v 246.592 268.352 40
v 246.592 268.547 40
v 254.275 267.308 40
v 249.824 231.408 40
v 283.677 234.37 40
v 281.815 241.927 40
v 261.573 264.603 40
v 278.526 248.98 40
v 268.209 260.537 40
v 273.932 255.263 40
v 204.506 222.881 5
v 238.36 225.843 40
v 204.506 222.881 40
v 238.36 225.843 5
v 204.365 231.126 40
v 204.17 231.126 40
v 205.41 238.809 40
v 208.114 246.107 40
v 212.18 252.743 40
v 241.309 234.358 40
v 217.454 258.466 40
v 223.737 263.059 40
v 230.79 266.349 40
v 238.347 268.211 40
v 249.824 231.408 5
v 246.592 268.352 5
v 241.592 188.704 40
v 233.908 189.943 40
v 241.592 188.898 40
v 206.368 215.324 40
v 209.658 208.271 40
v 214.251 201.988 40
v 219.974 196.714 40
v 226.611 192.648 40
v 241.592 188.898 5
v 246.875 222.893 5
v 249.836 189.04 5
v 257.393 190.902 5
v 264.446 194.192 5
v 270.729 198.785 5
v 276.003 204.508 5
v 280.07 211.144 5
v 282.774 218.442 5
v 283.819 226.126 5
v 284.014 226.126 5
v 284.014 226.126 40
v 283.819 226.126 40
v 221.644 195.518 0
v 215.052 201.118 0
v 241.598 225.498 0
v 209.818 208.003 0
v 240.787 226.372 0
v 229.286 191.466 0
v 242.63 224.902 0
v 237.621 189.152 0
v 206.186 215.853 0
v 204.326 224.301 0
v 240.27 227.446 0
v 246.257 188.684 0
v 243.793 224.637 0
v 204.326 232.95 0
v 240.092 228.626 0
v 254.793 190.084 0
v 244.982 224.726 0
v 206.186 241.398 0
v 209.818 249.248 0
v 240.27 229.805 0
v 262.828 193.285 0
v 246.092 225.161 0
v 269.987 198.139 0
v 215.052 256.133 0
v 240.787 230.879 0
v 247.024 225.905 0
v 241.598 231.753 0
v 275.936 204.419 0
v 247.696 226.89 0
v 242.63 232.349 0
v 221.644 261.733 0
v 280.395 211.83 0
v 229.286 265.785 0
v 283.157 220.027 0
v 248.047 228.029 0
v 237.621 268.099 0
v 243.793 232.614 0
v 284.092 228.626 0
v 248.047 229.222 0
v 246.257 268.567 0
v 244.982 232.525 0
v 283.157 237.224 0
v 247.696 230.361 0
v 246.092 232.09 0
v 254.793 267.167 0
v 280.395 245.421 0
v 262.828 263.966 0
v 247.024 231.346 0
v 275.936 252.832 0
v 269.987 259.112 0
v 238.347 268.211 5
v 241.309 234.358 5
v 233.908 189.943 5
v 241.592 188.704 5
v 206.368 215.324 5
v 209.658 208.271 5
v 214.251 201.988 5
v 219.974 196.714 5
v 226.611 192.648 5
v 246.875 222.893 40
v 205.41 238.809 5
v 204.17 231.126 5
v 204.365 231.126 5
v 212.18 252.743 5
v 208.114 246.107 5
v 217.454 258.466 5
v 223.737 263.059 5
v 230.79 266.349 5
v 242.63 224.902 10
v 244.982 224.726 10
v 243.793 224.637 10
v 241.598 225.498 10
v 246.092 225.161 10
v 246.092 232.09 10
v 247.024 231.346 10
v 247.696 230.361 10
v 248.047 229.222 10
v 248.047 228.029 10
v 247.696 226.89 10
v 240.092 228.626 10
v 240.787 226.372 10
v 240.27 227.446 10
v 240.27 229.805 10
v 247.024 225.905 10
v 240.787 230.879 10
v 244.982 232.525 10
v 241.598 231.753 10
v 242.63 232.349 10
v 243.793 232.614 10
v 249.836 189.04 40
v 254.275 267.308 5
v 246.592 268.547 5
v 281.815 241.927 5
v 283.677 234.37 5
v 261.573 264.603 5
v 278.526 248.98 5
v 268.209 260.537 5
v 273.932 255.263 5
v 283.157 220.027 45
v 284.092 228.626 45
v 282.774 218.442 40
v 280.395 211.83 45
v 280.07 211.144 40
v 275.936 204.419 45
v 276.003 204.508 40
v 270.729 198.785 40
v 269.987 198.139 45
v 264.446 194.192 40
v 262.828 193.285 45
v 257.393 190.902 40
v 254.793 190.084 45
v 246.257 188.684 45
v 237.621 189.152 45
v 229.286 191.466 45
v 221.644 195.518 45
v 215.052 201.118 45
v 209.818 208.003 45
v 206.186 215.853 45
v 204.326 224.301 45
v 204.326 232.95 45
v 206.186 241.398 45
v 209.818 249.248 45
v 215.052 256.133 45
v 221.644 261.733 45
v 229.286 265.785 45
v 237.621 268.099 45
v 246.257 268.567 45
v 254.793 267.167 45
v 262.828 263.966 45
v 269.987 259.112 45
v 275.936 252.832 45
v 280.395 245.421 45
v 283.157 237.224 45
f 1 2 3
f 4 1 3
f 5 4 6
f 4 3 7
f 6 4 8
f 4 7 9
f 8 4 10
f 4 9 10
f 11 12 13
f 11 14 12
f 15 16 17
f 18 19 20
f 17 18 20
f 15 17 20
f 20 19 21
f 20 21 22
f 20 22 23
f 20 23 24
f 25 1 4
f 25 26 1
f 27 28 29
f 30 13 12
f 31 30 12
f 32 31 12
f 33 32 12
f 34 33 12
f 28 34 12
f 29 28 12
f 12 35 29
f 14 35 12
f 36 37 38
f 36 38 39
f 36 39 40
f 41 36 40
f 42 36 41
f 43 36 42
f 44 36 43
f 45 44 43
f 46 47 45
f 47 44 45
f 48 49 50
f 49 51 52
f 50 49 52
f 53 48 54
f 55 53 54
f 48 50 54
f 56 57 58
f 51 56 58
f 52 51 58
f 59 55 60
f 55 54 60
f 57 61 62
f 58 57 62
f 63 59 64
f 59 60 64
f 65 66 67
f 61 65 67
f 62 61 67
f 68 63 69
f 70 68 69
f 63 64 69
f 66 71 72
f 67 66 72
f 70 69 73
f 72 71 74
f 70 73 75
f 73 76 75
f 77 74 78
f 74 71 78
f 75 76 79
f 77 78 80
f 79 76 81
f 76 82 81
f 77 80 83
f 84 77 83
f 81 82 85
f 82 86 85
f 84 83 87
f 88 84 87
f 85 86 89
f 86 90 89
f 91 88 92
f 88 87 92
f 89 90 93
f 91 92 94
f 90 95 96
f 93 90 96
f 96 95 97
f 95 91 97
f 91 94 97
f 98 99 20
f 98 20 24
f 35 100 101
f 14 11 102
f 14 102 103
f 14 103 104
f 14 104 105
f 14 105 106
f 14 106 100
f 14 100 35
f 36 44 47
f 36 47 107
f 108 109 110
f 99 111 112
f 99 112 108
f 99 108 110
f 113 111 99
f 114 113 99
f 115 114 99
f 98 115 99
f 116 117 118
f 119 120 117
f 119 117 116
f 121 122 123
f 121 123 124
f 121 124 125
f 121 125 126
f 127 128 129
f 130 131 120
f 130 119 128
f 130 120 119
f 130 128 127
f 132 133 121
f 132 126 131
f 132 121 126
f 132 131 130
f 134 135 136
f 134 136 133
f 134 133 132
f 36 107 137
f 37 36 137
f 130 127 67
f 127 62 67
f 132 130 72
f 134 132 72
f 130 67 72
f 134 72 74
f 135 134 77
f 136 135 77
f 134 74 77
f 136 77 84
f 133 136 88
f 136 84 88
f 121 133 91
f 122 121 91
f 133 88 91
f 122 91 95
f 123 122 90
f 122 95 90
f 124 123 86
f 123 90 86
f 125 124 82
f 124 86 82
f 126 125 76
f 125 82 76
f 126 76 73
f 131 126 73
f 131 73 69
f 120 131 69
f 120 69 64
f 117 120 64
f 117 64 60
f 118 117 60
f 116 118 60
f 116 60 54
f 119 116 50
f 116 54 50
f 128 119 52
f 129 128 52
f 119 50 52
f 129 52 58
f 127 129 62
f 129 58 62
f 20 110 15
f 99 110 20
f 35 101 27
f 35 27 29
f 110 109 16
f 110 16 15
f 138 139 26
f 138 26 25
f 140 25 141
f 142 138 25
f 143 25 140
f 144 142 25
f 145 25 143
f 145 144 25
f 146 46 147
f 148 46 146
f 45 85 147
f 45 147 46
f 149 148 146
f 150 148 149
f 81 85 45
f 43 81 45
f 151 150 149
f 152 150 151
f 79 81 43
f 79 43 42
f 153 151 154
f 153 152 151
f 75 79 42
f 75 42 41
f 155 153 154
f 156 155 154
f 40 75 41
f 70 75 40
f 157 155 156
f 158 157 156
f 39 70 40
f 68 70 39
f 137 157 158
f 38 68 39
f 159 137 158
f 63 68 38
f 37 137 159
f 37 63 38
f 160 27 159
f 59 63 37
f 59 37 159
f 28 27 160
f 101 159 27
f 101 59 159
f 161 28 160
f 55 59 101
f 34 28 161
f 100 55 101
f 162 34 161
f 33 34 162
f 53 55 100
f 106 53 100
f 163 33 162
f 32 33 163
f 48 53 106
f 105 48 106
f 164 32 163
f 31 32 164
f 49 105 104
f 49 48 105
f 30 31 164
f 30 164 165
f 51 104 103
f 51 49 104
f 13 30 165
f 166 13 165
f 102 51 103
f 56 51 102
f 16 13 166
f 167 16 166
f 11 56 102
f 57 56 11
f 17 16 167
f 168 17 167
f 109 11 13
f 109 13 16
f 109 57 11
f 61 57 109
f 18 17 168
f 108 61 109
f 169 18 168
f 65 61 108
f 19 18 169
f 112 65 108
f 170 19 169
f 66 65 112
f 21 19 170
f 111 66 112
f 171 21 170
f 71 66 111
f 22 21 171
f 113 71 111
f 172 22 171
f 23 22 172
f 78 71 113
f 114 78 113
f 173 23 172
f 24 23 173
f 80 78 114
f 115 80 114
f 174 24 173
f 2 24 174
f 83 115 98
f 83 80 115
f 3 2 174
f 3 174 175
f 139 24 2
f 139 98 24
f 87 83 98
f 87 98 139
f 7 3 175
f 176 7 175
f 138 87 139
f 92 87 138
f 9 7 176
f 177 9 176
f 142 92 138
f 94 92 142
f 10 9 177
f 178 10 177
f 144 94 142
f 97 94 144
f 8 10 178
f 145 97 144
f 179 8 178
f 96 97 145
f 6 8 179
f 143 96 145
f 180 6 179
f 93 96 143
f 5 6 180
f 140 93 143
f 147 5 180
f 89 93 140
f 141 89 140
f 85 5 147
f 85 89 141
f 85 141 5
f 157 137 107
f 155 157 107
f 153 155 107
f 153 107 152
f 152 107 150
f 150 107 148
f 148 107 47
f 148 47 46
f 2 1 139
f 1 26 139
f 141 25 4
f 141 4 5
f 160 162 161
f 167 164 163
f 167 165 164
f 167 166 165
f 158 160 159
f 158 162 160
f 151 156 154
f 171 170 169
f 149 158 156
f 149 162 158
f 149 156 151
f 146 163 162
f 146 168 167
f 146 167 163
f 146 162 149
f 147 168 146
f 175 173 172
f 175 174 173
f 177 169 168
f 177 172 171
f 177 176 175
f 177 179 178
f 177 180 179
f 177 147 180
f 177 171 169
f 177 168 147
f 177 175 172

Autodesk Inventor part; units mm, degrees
ref_plane "YZ Plane" through (0, 0, 0) normal (1, 0, 0) x (0, 1, 0)
ref_plane "XZ Plane" through (0, 0, 0) normal (0, 1, 0) x (-1, 0, 0)
ref_plane "XY Plane" through (0, 0, 0) normal (0, 0, 1) x (1, 0, 0)
sketch "Sketch1" plane through (0, 0, 0) normal (0, 0, 1) x (1, 0, 0)
  line L0 (204.17, 231.1255) -> (241.5918, 231.1255)
  line L1 (241.5918, 231.1255) -> (284.0136, 231.1255)
  line L2 (204.17, 226.1255) -> (241.5918, 226.1255)
  line L3 (246.5918, 226.1255) -> (284.0136, 226.1255)
  line L4 (246.5918, 188.7037) -> (246.5918, 226.1255)
  line L5 (246.5918, 231.1255) -> (246.5918, 268.5473)
  line L6 (241.5918, 188.7037) -> (241.5918, 226.1255)
  line L7 (241.5918, 231.1255) -> (241.5918, 268.5473)
  line L8 (241.5918, 231.1255) -> (288.8318, 231.1255) construction
  line L9 (246.5918, 231.1255) -> (303.9178, 231.1255) construction
  line L10 (246.5918, 288.5734) -> (304.1186, 288.5734) construction
  circle A0 centre (244.0918, 228.6255) radius 40
  line L11 (246.5918, 226.1255) -> (249.8364, 189.0401)
  line L12 (246.5918, 226.1255) -> (283.8188, 226.1255) construction
  line L13 (283.8188, 226.1255) -> (246.5918, 222.8685)
  line L14 (283.8188, 226.1255) -> (321.1881, 226.1255) construction
  line L15 (246.5918, 231.1255) -> (283.6772, 234.37)
  line L16 (246.5918, 268.3525) -> (249.8488, 231.1255)
  line L17 (241.5918, 231.1255) -> (238.3473, 268.2108)
  line L18 (204.3648, 231.1255) -> (241.5918, 234.3824)
  line L19 (241.5918, 226.1255) -> (204.5065, 222.8809)
  line L20 (241.5918, 188.8985) -> (238.3349, 226.1255)
  point P0 (0, 0)
  point P1 (303.8392, 234.1257)
  point P2 (241.3091, 234.3577)
  point P3 (249.824, 231.4082)
  point P4 (238.3596, 225.8427)
  point P5 (246.8746, 222.8933)
  dimension "d31" = 80
  dimension "d33" = 85
  dimension "d34" = 175
  dimension "d37" = 360
extrude "Extrusion1" add sketch "Sketch1" along normal blind 45
extrude "Extrusion2" cut sketch "Sketch1" along normal blind 40 contours A0 L17 L18 L0 | L19 L20 L6 A0 | A0 L15 L16 L5 | L11 L13 L3 A0
extrude "Extrusion4" add sketch "Sketch1" along normal blind 5 contours A0 L17 L18 L0 | L19 L20 L6 A0 | A0 L15 L16 L5 | L11 L13 L3 A0
ref_plane "Work Plane1" through (244.0918, 228.6255, 0) normal (0, 0, -1) x (-1, 0, 0)
sketch "Sketch2" plane through (244.0918, 228.6255, 0) normal (0, 0, -1) x (-1, 0, 0)
  circle A0 centre (0, 0) radius 4
  point P0 (244.0918, -228.6255)
  dimension "d28" = 8
extrude "Extrusion5" cut sketch "Sketch2" against normal blind 10
properties part number "wheel"
